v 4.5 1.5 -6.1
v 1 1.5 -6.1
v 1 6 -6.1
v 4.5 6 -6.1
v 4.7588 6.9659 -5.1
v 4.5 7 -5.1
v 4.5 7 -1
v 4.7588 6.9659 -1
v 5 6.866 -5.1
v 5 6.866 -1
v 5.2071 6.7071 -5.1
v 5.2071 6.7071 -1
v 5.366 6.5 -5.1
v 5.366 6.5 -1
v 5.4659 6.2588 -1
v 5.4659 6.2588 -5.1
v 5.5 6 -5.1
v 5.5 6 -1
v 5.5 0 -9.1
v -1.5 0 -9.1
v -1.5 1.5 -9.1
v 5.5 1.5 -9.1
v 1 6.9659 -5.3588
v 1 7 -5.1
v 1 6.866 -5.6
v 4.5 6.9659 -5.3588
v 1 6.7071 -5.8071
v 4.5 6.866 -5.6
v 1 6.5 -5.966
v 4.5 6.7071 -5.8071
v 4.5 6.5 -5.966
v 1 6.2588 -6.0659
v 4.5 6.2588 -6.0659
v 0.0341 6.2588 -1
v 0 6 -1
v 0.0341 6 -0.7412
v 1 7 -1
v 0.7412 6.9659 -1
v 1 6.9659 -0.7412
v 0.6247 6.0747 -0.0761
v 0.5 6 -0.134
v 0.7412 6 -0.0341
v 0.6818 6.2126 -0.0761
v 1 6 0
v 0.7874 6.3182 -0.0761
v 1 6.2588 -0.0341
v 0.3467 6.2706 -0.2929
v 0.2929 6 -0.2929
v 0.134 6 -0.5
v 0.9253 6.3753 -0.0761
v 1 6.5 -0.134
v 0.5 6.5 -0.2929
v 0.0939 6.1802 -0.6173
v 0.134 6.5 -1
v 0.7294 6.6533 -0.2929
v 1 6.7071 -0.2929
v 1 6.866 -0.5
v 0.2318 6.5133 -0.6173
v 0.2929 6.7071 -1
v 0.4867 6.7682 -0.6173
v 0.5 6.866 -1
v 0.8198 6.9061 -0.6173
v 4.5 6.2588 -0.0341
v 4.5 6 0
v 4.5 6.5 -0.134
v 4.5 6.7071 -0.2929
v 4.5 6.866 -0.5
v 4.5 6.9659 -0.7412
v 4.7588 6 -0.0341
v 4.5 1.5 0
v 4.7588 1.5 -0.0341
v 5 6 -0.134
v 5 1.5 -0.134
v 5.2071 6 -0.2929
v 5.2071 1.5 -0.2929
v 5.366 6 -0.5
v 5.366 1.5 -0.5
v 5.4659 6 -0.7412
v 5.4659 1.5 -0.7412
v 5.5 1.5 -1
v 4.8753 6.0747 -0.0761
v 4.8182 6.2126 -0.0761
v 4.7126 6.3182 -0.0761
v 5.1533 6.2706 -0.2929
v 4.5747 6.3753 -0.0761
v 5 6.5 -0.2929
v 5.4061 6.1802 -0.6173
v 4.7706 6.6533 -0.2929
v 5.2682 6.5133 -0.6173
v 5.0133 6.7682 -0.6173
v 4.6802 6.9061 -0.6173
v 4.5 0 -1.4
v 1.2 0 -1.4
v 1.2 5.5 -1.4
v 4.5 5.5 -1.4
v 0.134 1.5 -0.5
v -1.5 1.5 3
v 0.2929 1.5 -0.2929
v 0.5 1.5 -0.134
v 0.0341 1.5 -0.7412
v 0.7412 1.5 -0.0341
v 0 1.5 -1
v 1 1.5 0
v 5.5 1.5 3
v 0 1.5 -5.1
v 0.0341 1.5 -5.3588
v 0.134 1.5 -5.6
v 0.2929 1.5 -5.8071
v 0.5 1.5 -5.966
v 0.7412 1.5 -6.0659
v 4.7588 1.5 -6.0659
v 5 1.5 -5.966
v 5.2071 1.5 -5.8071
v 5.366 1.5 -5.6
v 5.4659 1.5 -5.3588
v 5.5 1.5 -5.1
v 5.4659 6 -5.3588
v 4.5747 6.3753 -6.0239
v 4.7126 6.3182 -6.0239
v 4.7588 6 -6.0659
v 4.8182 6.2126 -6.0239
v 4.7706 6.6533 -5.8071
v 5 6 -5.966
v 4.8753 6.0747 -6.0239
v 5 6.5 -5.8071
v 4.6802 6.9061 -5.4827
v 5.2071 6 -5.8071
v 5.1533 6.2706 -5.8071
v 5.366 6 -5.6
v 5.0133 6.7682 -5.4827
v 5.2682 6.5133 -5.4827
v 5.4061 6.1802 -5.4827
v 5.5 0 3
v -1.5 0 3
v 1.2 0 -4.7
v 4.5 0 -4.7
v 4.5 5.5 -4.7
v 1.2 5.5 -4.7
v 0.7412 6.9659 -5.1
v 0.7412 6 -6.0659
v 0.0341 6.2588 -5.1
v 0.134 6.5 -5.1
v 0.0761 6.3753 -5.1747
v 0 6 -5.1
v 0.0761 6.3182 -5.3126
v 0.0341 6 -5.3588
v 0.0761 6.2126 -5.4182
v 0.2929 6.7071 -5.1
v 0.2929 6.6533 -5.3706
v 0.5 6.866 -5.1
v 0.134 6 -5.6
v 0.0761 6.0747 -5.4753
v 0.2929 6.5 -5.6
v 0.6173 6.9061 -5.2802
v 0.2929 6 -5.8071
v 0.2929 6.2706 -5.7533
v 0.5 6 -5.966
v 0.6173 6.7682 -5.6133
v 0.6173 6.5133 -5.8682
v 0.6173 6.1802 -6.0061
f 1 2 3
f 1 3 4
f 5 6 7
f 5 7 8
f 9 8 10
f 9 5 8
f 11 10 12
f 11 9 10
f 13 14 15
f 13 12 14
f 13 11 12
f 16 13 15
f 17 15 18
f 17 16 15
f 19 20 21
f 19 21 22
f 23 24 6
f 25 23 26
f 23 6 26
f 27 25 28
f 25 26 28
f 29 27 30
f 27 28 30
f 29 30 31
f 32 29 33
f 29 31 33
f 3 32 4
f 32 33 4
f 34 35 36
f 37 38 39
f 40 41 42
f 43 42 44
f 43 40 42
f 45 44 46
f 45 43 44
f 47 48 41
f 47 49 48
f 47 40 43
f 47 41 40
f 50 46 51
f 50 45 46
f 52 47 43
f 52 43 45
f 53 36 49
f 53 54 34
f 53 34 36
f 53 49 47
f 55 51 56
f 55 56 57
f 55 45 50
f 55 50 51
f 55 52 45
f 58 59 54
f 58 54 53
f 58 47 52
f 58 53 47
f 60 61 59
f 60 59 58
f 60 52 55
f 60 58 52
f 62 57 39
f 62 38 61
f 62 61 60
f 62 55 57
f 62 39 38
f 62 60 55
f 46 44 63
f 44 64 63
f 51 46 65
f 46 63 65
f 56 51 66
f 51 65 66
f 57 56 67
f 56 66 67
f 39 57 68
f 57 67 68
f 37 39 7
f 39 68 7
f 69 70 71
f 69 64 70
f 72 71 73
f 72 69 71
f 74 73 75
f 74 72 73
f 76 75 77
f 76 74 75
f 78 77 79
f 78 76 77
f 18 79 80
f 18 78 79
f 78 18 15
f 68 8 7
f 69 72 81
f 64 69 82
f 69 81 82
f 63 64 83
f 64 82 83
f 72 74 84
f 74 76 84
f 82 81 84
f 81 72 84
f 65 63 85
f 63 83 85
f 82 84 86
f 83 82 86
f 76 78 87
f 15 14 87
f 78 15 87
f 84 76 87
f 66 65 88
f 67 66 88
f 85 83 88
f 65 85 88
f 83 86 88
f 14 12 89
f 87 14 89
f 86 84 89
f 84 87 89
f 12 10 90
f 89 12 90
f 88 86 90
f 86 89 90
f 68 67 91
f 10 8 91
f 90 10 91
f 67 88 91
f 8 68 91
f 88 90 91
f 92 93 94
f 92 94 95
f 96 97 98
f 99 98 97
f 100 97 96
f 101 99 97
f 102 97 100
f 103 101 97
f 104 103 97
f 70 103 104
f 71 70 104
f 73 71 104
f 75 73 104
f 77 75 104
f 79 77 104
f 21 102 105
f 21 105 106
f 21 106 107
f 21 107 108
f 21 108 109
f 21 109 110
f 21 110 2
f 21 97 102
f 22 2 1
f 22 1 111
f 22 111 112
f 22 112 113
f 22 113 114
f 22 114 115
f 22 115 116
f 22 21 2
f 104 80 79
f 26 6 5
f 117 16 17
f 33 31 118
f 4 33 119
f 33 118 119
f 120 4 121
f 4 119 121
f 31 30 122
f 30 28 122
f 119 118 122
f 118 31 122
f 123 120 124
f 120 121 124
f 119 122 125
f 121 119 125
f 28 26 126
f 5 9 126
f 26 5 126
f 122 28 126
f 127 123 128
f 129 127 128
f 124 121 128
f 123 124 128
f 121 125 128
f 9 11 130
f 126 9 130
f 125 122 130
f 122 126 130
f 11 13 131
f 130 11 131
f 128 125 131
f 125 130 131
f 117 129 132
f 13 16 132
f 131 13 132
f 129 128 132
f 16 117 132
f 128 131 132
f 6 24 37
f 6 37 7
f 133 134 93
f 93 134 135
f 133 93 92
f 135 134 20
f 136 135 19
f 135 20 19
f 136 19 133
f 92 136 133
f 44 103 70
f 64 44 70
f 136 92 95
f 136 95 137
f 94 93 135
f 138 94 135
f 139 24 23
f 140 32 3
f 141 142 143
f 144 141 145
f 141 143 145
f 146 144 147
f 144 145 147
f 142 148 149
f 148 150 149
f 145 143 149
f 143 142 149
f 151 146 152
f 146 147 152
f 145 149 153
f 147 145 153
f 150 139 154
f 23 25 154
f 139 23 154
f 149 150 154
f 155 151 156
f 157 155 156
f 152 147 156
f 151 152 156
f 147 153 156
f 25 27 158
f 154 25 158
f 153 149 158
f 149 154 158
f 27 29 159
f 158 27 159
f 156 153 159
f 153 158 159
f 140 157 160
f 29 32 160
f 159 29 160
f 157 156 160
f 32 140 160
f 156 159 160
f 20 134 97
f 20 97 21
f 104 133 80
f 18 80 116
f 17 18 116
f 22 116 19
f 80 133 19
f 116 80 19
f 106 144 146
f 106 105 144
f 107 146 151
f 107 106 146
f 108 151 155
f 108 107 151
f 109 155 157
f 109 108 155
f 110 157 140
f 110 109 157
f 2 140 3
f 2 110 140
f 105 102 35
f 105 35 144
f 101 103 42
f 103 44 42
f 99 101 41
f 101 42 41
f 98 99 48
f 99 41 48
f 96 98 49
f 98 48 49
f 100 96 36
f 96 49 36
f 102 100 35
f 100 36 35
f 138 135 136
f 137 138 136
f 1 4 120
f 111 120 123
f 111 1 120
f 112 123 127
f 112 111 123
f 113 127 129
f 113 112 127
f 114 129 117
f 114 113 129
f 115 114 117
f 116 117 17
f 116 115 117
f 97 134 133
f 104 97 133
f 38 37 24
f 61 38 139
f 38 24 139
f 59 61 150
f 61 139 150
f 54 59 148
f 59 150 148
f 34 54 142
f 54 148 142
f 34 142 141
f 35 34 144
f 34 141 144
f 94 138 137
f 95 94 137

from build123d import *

# Parameters (mm, degrees)
SKETCH1_W           = 5.5
SKETCH1_H           = 6.1
SKETCH1_W_2         = 3.3
SKETCH1_H_2         = 3.3
BOSS_EXTRUDE1_DEPTH = 7
SKETCH2_W           = 5.5
SKETCH2_H           = 6.1
BOSS_EXTRUDE2_DEPTH = 1.5
SKETCH3_W           = 7
SKETCH3_H           = 12.1
SKETCH3_W_2         = 3.3
SKETCH3_H_2         = 3.3
BOSS_EXTRUDE3_DEPTH = 1.5
FILLET1_R           = 1


with BuildPart() as part:
    # Sketch1 → Boss-Extrude1 (new body)
    with BuildSketch(Plane(origin=(0, 0, 0), x_dir=(1, 0, 0), z_dir=(0, 1, 0))):
        with Locations((2.75, 3.05)):
            Rectangle(SKETCH1_W, SKETCH1_H)
        with Locations((2.85, 3.05)):
            Rectangle(SKETCH1_W_2, SKETCH1_H_2, mode=Mode.SUBTRACT)
    extrude(amount=BOSS_EXTRUDE1_DEPTH)

    # Sketch2 → Boss-Extrude2 (add)
    with BuildSketch(Plane(origin=(0, 7, 0), x_dir=(1, 0, 0), z_dir=(0, 1, 0))):
        with Locations((2.75, 3.05)):
            Rectangle(SKETCH2_W, SKETCH2_H)
    extrude(amount=-BOSS_EXTRUDE2_DEPTH)

    # Sketch3 → Boss-Extrude3 (add)
    with BuildSketch(Plane(origin=(0, 0, 0), x_dir=(1, 0, 0), z_dir=(0, 1, 0))):
        with Locations((2, 3.05)):
            Rectangle(SKETCH3_W, SKETCH3_H)
        with Locations((2.85, 3.05)):
            Rectangle(SKETCH3_W_2, SKETCH3_H_2, mode=Mode.SUBTRACT)
    extrude(amount=BOSS_EXTRUDE3_DEPTH)

    # Fillet1
    fillet1_edges = [part.edges().sort_by_distance(p)[0] for p in [
        (5.5, 7, -3.05),
        (2.75, 7, -6.1),
        (0, 7, -3.05),
        (0, 4.25, -6.1),
        (5.5, 4.25, -6.1),
        (5.5, 4.25, 0),
        (0, 4.25, 0),
        (2.75, 7, 0),
    ]]
    fillet(fillet1_edges, radius=FILLET1_R)


solid = part.part
